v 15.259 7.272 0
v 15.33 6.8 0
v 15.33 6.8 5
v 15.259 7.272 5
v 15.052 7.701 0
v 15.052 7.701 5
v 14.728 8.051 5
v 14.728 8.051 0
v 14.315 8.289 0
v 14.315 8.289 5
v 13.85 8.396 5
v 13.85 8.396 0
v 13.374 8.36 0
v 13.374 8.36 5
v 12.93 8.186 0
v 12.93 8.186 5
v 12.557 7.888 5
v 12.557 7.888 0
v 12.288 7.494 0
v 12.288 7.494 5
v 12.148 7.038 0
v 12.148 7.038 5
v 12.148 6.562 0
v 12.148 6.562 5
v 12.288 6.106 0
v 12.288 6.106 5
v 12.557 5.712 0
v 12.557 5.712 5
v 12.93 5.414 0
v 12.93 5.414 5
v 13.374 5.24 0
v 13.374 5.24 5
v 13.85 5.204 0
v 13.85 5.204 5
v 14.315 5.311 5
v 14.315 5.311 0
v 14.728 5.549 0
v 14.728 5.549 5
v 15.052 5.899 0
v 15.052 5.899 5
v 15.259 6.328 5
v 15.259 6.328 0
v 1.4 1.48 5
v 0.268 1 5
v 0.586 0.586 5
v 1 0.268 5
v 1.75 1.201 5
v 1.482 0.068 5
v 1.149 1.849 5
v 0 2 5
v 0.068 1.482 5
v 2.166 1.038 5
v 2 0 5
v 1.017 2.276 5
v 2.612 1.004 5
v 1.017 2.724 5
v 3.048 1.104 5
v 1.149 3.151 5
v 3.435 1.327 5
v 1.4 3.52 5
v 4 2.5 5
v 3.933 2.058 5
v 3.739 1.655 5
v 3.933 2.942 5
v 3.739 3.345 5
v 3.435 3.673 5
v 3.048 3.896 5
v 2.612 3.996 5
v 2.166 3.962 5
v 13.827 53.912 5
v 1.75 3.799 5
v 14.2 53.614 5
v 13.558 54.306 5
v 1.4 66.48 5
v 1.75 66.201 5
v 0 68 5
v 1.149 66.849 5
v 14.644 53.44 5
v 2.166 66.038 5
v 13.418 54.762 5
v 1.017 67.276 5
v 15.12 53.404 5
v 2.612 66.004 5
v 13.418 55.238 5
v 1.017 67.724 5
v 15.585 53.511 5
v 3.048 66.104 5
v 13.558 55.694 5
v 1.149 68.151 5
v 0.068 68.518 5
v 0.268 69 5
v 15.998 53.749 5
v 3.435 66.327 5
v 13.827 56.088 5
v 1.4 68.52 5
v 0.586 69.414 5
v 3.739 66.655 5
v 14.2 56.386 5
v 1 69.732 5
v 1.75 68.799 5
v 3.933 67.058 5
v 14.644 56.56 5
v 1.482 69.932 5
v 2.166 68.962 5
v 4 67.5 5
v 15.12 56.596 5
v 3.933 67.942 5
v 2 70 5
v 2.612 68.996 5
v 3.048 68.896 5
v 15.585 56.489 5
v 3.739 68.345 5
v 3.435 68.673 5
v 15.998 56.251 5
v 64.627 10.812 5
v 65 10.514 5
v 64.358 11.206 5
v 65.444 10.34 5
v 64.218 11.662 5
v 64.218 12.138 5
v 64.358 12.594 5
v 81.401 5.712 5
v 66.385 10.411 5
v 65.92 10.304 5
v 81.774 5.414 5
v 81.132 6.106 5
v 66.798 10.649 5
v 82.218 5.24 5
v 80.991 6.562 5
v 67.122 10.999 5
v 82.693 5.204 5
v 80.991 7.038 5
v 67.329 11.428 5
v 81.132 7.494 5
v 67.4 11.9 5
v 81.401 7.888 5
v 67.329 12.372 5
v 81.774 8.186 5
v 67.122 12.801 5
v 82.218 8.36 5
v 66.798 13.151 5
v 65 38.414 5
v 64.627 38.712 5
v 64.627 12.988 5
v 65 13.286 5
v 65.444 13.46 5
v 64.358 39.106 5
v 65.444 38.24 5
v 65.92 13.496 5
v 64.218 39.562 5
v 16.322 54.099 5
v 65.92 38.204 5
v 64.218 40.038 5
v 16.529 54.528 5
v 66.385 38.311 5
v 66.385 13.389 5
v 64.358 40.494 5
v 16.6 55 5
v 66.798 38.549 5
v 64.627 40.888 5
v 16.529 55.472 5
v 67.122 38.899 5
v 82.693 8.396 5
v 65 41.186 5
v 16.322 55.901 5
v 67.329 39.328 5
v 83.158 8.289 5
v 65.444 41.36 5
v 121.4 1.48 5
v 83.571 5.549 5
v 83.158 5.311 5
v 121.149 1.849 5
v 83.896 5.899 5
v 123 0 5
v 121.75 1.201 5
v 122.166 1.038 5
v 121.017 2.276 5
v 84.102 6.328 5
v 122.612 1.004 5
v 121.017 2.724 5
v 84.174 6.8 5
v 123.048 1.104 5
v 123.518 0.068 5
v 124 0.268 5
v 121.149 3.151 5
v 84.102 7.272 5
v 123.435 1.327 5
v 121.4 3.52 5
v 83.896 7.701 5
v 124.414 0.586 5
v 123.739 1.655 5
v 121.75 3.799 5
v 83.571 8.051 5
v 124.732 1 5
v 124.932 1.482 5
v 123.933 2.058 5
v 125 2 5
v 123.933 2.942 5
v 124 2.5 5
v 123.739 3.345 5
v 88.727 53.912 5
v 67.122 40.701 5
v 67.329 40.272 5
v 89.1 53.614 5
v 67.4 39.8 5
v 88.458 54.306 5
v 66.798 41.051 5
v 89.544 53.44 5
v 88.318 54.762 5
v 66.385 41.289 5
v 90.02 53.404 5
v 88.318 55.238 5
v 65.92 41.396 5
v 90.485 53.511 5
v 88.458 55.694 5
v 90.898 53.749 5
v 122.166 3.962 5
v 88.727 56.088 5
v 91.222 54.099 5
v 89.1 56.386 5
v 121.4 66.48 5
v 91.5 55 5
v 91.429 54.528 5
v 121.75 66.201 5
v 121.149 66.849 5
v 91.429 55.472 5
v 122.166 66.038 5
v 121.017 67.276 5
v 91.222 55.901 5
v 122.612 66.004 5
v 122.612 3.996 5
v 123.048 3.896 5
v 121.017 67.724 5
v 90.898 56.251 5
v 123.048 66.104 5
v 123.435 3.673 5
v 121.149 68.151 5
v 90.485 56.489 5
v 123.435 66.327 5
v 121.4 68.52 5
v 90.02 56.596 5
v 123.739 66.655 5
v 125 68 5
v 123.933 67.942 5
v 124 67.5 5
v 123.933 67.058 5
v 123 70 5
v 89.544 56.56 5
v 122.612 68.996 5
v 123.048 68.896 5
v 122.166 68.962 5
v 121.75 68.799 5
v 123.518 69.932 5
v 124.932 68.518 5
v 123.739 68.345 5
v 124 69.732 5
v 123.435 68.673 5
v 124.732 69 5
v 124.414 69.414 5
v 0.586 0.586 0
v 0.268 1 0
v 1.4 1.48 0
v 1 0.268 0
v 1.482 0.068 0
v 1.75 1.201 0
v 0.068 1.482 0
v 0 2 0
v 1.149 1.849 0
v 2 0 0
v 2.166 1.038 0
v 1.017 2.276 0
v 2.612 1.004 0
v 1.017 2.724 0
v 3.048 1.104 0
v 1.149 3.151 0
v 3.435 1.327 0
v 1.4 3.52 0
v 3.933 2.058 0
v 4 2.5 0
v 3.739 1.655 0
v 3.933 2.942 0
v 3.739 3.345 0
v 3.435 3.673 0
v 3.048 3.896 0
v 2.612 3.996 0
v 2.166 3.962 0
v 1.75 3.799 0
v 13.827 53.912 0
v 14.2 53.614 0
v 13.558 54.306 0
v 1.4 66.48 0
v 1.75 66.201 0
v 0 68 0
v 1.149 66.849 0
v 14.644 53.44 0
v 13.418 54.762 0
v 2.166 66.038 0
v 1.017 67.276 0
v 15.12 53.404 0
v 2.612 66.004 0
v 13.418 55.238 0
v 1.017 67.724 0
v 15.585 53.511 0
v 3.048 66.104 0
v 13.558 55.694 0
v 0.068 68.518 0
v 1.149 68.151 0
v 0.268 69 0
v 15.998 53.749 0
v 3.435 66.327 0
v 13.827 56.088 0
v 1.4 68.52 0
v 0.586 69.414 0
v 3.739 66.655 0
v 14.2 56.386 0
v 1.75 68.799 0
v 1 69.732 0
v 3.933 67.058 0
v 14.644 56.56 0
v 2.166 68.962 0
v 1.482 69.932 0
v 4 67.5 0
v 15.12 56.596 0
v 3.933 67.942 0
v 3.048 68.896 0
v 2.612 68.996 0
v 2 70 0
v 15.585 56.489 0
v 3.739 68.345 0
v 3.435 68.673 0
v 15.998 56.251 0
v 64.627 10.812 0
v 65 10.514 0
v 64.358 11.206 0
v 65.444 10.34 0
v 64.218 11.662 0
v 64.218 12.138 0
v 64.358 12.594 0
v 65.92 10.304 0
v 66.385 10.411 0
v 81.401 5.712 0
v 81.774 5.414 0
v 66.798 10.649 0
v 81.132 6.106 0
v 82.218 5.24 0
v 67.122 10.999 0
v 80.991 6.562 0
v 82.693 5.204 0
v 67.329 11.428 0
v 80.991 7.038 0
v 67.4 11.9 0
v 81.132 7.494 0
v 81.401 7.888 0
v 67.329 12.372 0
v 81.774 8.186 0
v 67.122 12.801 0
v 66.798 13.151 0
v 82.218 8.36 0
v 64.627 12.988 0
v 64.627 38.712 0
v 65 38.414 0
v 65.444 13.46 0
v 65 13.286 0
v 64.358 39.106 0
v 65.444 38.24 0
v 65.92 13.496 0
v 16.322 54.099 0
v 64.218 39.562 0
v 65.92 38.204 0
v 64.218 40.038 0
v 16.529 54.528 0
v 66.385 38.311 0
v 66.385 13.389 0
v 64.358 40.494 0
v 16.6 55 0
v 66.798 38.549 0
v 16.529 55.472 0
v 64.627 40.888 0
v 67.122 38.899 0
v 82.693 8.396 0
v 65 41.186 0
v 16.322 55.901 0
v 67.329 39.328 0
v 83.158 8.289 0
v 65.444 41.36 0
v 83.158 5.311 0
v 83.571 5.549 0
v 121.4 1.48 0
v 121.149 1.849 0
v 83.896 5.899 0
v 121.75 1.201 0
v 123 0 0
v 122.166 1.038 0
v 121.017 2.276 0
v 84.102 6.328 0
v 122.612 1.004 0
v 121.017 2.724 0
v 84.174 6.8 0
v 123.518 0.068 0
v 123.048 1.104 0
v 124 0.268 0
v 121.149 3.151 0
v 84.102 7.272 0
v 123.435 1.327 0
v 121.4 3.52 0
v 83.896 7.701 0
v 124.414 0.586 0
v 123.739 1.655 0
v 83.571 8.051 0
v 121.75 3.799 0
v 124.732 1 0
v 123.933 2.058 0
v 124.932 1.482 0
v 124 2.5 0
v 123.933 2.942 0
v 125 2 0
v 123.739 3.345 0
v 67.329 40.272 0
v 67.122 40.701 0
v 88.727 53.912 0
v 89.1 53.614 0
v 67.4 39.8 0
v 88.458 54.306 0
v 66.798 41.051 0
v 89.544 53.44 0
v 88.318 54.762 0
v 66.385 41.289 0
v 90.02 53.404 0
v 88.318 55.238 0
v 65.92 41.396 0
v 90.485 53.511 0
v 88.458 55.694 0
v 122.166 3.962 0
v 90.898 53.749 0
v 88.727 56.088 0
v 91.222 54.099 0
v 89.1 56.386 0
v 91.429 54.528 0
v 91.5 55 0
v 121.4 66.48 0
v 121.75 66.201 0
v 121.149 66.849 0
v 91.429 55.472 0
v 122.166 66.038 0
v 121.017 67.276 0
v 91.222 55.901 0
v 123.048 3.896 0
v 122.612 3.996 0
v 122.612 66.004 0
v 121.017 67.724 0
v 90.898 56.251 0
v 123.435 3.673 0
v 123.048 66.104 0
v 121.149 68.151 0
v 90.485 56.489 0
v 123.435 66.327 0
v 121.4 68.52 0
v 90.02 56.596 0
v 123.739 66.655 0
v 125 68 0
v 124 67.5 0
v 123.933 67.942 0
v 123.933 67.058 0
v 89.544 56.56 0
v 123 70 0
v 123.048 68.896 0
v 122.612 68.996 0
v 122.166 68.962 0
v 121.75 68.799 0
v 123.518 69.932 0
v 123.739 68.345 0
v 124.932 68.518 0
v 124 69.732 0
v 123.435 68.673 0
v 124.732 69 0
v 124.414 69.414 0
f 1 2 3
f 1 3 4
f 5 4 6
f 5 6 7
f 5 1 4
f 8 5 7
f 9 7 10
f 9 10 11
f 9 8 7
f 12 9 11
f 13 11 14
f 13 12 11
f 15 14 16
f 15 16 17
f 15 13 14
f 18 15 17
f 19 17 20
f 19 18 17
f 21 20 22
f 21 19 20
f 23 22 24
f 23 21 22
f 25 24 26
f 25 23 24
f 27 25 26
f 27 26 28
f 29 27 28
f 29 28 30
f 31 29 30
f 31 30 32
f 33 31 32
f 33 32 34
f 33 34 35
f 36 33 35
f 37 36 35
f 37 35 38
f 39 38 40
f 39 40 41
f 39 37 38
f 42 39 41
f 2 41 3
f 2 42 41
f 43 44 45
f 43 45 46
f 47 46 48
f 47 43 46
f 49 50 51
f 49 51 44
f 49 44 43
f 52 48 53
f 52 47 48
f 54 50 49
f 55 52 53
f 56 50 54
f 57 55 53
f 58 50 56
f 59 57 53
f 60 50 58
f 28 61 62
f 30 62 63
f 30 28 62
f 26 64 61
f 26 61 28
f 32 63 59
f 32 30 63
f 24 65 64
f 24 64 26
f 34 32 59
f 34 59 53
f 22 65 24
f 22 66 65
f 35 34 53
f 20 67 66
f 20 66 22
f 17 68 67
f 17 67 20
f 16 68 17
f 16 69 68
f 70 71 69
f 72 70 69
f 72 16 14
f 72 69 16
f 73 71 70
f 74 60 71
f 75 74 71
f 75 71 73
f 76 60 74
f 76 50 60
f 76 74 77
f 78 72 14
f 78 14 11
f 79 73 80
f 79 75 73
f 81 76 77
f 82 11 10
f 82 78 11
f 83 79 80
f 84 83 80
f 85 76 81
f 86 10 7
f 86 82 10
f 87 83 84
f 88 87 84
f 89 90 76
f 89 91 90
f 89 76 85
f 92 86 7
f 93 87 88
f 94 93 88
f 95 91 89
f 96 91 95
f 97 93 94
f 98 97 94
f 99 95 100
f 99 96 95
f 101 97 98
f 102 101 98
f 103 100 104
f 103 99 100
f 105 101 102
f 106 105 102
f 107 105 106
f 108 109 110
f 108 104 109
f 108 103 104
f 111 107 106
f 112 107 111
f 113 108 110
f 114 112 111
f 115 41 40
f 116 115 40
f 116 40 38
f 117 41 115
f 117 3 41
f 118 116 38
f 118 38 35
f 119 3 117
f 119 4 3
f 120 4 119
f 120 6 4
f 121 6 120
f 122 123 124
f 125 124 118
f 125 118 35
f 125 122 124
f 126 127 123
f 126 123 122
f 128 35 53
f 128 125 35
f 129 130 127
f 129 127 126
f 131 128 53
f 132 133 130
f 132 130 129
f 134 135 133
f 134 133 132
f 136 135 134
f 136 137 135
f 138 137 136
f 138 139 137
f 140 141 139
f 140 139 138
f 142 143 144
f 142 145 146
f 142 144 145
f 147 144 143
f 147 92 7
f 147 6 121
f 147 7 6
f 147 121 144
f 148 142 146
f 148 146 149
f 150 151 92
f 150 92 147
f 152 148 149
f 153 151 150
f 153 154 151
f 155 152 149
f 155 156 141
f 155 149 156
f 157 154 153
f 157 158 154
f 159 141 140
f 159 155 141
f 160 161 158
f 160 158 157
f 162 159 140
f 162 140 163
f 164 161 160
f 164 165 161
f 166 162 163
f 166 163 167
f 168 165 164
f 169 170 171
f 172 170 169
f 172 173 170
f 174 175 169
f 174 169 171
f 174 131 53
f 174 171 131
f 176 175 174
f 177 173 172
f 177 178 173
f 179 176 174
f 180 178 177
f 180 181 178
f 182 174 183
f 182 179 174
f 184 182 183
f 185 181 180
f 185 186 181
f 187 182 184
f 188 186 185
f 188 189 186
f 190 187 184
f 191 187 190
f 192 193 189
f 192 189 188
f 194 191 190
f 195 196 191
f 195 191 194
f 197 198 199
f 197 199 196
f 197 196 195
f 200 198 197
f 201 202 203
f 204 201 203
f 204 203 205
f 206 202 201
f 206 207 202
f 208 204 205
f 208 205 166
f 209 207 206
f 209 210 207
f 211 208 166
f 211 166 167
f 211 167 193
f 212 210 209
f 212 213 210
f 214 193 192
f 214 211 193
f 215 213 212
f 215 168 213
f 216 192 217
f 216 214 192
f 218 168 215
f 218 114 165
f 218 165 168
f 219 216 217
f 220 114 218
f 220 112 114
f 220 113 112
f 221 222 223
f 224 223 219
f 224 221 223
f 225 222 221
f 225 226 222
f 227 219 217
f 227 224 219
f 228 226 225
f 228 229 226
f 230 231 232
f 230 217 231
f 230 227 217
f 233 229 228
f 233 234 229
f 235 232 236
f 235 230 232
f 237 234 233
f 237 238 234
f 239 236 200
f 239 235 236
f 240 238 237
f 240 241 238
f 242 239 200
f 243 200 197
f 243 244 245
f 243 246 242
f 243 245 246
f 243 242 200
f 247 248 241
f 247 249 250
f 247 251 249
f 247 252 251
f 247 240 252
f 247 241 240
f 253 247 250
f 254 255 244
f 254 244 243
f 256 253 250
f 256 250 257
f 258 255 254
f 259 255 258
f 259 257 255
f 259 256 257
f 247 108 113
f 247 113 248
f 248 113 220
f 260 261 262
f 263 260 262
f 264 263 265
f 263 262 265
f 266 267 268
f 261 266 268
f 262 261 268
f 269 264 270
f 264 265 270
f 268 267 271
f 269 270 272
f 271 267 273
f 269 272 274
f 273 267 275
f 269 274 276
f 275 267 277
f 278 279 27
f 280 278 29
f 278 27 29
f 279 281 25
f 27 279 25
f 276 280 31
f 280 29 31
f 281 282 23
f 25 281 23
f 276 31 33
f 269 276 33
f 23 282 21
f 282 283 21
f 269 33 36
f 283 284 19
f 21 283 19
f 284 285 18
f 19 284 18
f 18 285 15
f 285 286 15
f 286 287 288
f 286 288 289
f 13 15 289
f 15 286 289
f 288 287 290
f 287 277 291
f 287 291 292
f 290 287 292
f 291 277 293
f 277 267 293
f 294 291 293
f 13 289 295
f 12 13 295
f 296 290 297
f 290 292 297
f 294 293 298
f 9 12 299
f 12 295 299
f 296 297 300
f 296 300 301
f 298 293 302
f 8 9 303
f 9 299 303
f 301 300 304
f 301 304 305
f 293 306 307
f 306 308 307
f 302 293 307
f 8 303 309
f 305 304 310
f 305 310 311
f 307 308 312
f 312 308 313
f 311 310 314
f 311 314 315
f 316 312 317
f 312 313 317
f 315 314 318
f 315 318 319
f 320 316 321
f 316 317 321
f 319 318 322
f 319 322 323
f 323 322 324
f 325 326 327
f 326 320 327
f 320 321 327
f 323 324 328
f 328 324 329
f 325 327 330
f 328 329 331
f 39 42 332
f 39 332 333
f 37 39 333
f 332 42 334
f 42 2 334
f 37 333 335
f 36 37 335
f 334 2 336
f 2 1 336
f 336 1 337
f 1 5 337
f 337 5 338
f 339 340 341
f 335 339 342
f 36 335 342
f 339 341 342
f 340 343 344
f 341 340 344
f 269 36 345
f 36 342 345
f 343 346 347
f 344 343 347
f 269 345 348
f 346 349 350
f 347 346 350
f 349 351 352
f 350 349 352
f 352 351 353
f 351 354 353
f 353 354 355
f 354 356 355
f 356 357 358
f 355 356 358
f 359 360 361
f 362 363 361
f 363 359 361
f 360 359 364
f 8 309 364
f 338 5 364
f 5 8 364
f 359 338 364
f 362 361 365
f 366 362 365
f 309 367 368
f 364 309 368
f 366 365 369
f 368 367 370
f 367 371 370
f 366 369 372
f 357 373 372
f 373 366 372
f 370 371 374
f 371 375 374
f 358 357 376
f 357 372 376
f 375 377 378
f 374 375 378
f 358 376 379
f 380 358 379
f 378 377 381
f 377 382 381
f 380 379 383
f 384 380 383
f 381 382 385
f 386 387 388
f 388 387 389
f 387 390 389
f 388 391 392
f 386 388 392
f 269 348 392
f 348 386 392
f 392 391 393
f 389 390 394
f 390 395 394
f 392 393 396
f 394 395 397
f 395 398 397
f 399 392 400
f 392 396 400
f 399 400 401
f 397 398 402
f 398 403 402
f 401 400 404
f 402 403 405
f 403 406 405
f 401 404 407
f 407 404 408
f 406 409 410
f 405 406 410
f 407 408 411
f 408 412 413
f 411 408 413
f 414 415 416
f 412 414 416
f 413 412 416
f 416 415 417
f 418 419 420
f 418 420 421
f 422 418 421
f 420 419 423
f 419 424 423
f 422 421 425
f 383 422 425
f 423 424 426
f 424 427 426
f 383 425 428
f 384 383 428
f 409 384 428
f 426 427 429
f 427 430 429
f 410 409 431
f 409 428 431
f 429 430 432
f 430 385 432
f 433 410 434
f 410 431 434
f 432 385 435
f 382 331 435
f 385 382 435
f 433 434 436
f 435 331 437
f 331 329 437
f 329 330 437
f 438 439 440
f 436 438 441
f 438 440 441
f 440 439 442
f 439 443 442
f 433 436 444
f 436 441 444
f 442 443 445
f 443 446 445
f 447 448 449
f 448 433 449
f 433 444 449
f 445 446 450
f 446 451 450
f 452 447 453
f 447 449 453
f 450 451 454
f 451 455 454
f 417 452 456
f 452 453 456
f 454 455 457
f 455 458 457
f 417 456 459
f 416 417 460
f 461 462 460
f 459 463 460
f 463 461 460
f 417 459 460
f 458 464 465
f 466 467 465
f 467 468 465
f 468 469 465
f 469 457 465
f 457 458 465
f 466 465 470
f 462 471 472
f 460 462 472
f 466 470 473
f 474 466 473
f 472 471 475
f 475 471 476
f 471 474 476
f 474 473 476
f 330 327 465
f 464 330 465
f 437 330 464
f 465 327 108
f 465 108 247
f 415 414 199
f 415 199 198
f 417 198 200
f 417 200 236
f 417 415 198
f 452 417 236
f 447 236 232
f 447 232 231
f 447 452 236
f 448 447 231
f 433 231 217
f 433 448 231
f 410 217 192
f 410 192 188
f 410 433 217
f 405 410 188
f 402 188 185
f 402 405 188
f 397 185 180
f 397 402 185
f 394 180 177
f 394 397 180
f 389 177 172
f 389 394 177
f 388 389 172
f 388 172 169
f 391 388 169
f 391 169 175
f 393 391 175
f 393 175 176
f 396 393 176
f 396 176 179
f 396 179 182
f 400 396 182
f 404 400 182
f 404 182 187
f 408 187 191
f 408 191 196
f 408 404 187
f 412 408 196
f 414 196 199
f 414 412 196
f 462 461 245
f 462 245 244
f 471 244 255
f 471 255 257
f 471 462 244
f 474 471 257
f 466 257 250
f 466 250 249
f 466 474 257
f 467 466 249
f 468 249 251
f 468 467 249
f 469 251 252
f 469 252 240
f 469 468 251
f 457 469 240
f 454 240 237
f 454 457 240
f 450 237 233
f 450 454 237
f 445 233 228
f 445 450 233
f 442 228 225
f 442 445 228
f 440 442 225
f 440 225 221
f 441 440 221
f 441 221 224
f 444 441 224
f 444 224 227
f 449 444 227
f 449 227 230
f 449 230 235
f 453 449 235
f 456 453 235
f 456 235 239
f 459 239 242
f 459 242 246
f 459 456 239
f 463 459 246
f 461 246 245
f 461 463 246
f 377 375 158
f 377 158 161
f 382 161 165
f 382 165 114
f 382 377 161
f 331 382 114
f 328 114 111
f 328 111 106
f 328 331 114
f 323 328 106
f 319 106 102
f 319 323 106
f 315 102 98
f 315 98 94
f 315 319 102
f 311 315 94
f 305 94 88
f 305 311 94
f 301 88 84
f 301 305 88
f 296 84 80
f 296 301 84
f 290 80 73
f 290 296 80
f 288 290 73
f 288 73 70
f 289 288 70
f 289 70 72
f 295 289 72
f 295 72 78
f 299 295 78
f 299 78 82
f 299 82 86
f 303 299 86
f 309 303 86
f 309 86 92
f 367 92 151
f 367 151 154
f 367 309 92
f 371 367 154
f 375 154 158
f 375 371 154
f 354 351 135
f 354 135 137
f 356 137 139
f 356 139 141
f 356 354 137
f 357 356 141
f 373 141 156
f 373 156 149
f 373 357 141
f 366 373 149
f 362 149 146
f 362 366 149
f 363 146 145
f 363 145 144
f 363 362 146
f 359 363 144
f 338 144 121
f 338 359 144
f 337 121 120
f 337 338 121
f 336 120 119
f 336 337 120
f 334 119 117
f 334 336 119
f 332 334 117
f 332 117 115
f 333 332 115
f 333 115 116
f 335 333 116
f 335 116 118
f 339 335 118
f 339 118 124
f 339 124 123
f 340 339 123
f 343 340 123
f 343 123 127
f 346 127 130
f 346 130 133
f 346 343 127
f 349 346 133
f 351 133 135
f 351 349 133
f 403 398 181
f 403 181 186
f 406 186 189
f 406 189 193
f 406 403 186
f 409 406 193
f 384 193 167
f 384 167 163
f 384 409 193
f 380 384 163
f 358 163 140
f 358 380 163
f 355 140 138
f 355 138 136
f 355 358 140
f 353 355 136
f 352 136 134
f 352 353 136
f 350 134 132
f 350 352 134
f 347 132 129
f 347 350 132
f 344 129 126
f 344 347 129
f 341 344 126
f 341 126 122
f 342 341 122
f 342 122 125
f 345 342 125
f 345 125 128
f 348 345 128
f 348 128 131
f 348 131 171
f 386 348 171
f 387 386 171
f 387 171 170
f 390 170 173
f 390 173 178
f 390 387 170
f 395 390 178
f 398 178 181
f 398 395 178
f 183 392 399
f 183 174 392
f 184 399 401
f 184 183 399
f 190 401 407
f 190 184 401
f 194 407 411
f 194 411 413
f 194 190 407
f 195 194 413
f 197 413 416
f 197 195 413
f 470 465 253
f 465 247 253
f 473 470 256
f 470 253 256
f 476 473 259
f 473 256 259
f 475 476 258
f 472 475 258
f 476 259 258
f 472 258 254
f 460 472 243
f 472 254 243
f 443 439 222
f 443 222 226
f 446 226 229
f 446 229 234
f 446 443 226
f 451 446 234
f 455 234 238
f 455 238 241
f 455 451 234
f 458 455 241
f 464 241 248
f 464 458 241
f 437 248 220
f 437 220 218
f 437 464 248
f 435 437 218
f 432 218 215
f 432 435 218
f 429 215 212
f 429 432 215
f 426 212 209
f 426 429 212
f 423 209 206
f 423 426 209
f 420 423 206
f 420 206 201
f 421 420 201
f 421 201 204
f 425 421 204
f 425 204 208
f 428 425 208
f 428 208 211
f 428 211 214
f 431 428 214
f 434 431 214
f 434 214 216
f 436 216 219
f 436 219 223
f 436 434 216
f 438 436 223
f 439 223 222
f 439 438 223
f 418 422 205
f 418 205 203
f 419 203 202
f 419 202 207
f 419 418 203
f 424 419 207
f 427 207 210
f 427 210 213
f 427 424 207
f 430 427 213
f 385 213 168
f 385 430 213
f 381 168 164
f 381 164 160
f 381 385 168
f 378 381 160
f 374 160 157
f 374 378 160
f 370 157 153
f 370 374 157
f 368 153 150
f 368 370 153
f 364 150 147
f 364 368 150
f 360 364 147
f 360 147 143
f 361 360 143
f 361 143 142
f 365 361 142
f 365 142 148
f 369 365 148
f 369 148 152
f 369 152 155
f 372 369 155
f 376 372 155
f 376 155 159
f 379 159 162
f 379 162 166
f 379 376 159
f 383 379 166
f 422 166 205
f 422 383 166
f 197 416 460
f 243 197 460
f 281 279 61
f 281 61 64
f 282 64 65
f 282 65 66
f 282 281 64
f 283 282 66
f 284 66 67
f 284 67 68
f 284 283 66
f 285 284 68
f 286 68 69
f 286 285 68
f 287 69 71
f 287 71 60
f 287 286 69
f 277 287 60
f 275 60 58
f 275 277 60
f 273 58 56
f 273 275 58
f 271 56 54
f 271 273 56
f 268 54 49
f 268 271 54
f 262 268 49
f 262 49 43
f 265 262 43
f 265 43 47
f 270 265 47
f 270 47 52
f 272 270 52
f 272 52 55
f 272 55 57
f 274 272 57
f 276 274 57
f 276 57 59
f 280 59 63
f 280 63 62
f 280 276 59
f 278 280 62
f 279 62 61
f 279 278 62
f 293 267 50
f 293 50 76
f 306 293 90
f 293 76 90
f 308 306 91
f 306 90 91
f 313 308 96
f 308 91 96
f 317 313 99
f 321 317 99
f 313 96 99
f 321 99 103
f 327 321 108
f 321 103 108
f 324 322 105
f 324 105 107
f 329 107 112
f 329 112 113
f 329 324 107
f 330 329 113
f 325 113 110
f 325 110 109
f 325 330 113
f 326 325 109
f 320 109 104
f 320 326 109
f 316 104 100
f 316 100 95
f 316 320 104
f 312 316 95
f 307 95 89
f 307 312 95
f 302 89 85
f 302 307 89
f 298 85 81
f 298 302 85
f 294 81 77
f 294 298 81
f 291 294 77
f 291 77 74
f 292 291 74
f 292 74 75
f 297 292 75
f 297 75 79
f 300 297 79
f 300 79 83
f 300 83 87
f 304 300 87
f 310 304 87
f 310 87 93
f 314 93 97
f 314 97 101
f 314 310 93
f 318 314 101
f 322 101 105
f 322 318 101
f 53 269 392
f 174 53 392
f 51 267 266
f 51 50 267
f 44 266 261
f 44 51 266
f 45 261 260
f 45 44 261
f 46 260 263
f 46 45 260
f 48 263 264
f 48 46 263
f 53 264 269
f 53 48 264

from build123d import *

# Parameters (mm, degrees)
SKETCH1_W           = 125
SKETCH1_H           = 70
SKETCH1_R           = 1.6
SKETCH1_R_2         = 1.5
BOSS_EXTRUDE1_DEPTH = 5
FILLET1_R           = 2


with BuildPart() as part:
    # Sketch1 → Boss-Extrude1 (new body)
    with BuildSketch(Plane.XY):
        with Locations((62.5, 35)):
            Rectangle(SKETCH1_W, SKETCH1_H)
        with Locations((15, 55)):
            Circle(SKETCH1_R, mode=Mode.SUBTRACT)
        with Locations((13.73, 6.8)):
            Circle(SKETCH1_R, mode=Mode.SUBTRACT)
        with Locations((82.573533757, 6.8)):
            Circle(SKETCH1_R, mode=Mode.SUBTRACT)
        with Locations((89.9, 55)):
            Circle(SKETCH1_R, mode=Mode.SUBTRACT)
        with Locations((65.8, 39.8)):
            Circle(SKETCH1_R, mode=Mode.SUBTRACT)
        with Locations((65.8, 11.9)):
            Circle(SKETCH1_R, mode=Mode.SUBTRACT)
        with Locations((2.5, 67.5)):
            Circle(SKETCH1_R_2, mode=Mode.SUBTRACT)
        with Locations((122.5, 67.5)):
            Circle(SKETCH1_R_2, mode=Mode.SUBTRACT)
        with Locations((122.5, 2.5)):
            Circle(SKETCH1_R_2, mode=Mode.SUBTRACT)
        with Locations((2.5, 2.5)):
            Circle(SKETCH1_R_2, mode=Mode.SUBTRACT)
    extrude(amount=BOSS_EXTRUDE1_DEPTH)

    # Fillet1
    fillet1_edges = [part.edges().sort_by_distance(p)[0] for p in [
        (0, 70, 2.5),
        (125, 70, 2.5),
        (125, 0, 2.5),
        (0, 0, 2.5),
    ]]
    fillet(fillet1_edges, radius=FILLET1_R)


solid = part.part
